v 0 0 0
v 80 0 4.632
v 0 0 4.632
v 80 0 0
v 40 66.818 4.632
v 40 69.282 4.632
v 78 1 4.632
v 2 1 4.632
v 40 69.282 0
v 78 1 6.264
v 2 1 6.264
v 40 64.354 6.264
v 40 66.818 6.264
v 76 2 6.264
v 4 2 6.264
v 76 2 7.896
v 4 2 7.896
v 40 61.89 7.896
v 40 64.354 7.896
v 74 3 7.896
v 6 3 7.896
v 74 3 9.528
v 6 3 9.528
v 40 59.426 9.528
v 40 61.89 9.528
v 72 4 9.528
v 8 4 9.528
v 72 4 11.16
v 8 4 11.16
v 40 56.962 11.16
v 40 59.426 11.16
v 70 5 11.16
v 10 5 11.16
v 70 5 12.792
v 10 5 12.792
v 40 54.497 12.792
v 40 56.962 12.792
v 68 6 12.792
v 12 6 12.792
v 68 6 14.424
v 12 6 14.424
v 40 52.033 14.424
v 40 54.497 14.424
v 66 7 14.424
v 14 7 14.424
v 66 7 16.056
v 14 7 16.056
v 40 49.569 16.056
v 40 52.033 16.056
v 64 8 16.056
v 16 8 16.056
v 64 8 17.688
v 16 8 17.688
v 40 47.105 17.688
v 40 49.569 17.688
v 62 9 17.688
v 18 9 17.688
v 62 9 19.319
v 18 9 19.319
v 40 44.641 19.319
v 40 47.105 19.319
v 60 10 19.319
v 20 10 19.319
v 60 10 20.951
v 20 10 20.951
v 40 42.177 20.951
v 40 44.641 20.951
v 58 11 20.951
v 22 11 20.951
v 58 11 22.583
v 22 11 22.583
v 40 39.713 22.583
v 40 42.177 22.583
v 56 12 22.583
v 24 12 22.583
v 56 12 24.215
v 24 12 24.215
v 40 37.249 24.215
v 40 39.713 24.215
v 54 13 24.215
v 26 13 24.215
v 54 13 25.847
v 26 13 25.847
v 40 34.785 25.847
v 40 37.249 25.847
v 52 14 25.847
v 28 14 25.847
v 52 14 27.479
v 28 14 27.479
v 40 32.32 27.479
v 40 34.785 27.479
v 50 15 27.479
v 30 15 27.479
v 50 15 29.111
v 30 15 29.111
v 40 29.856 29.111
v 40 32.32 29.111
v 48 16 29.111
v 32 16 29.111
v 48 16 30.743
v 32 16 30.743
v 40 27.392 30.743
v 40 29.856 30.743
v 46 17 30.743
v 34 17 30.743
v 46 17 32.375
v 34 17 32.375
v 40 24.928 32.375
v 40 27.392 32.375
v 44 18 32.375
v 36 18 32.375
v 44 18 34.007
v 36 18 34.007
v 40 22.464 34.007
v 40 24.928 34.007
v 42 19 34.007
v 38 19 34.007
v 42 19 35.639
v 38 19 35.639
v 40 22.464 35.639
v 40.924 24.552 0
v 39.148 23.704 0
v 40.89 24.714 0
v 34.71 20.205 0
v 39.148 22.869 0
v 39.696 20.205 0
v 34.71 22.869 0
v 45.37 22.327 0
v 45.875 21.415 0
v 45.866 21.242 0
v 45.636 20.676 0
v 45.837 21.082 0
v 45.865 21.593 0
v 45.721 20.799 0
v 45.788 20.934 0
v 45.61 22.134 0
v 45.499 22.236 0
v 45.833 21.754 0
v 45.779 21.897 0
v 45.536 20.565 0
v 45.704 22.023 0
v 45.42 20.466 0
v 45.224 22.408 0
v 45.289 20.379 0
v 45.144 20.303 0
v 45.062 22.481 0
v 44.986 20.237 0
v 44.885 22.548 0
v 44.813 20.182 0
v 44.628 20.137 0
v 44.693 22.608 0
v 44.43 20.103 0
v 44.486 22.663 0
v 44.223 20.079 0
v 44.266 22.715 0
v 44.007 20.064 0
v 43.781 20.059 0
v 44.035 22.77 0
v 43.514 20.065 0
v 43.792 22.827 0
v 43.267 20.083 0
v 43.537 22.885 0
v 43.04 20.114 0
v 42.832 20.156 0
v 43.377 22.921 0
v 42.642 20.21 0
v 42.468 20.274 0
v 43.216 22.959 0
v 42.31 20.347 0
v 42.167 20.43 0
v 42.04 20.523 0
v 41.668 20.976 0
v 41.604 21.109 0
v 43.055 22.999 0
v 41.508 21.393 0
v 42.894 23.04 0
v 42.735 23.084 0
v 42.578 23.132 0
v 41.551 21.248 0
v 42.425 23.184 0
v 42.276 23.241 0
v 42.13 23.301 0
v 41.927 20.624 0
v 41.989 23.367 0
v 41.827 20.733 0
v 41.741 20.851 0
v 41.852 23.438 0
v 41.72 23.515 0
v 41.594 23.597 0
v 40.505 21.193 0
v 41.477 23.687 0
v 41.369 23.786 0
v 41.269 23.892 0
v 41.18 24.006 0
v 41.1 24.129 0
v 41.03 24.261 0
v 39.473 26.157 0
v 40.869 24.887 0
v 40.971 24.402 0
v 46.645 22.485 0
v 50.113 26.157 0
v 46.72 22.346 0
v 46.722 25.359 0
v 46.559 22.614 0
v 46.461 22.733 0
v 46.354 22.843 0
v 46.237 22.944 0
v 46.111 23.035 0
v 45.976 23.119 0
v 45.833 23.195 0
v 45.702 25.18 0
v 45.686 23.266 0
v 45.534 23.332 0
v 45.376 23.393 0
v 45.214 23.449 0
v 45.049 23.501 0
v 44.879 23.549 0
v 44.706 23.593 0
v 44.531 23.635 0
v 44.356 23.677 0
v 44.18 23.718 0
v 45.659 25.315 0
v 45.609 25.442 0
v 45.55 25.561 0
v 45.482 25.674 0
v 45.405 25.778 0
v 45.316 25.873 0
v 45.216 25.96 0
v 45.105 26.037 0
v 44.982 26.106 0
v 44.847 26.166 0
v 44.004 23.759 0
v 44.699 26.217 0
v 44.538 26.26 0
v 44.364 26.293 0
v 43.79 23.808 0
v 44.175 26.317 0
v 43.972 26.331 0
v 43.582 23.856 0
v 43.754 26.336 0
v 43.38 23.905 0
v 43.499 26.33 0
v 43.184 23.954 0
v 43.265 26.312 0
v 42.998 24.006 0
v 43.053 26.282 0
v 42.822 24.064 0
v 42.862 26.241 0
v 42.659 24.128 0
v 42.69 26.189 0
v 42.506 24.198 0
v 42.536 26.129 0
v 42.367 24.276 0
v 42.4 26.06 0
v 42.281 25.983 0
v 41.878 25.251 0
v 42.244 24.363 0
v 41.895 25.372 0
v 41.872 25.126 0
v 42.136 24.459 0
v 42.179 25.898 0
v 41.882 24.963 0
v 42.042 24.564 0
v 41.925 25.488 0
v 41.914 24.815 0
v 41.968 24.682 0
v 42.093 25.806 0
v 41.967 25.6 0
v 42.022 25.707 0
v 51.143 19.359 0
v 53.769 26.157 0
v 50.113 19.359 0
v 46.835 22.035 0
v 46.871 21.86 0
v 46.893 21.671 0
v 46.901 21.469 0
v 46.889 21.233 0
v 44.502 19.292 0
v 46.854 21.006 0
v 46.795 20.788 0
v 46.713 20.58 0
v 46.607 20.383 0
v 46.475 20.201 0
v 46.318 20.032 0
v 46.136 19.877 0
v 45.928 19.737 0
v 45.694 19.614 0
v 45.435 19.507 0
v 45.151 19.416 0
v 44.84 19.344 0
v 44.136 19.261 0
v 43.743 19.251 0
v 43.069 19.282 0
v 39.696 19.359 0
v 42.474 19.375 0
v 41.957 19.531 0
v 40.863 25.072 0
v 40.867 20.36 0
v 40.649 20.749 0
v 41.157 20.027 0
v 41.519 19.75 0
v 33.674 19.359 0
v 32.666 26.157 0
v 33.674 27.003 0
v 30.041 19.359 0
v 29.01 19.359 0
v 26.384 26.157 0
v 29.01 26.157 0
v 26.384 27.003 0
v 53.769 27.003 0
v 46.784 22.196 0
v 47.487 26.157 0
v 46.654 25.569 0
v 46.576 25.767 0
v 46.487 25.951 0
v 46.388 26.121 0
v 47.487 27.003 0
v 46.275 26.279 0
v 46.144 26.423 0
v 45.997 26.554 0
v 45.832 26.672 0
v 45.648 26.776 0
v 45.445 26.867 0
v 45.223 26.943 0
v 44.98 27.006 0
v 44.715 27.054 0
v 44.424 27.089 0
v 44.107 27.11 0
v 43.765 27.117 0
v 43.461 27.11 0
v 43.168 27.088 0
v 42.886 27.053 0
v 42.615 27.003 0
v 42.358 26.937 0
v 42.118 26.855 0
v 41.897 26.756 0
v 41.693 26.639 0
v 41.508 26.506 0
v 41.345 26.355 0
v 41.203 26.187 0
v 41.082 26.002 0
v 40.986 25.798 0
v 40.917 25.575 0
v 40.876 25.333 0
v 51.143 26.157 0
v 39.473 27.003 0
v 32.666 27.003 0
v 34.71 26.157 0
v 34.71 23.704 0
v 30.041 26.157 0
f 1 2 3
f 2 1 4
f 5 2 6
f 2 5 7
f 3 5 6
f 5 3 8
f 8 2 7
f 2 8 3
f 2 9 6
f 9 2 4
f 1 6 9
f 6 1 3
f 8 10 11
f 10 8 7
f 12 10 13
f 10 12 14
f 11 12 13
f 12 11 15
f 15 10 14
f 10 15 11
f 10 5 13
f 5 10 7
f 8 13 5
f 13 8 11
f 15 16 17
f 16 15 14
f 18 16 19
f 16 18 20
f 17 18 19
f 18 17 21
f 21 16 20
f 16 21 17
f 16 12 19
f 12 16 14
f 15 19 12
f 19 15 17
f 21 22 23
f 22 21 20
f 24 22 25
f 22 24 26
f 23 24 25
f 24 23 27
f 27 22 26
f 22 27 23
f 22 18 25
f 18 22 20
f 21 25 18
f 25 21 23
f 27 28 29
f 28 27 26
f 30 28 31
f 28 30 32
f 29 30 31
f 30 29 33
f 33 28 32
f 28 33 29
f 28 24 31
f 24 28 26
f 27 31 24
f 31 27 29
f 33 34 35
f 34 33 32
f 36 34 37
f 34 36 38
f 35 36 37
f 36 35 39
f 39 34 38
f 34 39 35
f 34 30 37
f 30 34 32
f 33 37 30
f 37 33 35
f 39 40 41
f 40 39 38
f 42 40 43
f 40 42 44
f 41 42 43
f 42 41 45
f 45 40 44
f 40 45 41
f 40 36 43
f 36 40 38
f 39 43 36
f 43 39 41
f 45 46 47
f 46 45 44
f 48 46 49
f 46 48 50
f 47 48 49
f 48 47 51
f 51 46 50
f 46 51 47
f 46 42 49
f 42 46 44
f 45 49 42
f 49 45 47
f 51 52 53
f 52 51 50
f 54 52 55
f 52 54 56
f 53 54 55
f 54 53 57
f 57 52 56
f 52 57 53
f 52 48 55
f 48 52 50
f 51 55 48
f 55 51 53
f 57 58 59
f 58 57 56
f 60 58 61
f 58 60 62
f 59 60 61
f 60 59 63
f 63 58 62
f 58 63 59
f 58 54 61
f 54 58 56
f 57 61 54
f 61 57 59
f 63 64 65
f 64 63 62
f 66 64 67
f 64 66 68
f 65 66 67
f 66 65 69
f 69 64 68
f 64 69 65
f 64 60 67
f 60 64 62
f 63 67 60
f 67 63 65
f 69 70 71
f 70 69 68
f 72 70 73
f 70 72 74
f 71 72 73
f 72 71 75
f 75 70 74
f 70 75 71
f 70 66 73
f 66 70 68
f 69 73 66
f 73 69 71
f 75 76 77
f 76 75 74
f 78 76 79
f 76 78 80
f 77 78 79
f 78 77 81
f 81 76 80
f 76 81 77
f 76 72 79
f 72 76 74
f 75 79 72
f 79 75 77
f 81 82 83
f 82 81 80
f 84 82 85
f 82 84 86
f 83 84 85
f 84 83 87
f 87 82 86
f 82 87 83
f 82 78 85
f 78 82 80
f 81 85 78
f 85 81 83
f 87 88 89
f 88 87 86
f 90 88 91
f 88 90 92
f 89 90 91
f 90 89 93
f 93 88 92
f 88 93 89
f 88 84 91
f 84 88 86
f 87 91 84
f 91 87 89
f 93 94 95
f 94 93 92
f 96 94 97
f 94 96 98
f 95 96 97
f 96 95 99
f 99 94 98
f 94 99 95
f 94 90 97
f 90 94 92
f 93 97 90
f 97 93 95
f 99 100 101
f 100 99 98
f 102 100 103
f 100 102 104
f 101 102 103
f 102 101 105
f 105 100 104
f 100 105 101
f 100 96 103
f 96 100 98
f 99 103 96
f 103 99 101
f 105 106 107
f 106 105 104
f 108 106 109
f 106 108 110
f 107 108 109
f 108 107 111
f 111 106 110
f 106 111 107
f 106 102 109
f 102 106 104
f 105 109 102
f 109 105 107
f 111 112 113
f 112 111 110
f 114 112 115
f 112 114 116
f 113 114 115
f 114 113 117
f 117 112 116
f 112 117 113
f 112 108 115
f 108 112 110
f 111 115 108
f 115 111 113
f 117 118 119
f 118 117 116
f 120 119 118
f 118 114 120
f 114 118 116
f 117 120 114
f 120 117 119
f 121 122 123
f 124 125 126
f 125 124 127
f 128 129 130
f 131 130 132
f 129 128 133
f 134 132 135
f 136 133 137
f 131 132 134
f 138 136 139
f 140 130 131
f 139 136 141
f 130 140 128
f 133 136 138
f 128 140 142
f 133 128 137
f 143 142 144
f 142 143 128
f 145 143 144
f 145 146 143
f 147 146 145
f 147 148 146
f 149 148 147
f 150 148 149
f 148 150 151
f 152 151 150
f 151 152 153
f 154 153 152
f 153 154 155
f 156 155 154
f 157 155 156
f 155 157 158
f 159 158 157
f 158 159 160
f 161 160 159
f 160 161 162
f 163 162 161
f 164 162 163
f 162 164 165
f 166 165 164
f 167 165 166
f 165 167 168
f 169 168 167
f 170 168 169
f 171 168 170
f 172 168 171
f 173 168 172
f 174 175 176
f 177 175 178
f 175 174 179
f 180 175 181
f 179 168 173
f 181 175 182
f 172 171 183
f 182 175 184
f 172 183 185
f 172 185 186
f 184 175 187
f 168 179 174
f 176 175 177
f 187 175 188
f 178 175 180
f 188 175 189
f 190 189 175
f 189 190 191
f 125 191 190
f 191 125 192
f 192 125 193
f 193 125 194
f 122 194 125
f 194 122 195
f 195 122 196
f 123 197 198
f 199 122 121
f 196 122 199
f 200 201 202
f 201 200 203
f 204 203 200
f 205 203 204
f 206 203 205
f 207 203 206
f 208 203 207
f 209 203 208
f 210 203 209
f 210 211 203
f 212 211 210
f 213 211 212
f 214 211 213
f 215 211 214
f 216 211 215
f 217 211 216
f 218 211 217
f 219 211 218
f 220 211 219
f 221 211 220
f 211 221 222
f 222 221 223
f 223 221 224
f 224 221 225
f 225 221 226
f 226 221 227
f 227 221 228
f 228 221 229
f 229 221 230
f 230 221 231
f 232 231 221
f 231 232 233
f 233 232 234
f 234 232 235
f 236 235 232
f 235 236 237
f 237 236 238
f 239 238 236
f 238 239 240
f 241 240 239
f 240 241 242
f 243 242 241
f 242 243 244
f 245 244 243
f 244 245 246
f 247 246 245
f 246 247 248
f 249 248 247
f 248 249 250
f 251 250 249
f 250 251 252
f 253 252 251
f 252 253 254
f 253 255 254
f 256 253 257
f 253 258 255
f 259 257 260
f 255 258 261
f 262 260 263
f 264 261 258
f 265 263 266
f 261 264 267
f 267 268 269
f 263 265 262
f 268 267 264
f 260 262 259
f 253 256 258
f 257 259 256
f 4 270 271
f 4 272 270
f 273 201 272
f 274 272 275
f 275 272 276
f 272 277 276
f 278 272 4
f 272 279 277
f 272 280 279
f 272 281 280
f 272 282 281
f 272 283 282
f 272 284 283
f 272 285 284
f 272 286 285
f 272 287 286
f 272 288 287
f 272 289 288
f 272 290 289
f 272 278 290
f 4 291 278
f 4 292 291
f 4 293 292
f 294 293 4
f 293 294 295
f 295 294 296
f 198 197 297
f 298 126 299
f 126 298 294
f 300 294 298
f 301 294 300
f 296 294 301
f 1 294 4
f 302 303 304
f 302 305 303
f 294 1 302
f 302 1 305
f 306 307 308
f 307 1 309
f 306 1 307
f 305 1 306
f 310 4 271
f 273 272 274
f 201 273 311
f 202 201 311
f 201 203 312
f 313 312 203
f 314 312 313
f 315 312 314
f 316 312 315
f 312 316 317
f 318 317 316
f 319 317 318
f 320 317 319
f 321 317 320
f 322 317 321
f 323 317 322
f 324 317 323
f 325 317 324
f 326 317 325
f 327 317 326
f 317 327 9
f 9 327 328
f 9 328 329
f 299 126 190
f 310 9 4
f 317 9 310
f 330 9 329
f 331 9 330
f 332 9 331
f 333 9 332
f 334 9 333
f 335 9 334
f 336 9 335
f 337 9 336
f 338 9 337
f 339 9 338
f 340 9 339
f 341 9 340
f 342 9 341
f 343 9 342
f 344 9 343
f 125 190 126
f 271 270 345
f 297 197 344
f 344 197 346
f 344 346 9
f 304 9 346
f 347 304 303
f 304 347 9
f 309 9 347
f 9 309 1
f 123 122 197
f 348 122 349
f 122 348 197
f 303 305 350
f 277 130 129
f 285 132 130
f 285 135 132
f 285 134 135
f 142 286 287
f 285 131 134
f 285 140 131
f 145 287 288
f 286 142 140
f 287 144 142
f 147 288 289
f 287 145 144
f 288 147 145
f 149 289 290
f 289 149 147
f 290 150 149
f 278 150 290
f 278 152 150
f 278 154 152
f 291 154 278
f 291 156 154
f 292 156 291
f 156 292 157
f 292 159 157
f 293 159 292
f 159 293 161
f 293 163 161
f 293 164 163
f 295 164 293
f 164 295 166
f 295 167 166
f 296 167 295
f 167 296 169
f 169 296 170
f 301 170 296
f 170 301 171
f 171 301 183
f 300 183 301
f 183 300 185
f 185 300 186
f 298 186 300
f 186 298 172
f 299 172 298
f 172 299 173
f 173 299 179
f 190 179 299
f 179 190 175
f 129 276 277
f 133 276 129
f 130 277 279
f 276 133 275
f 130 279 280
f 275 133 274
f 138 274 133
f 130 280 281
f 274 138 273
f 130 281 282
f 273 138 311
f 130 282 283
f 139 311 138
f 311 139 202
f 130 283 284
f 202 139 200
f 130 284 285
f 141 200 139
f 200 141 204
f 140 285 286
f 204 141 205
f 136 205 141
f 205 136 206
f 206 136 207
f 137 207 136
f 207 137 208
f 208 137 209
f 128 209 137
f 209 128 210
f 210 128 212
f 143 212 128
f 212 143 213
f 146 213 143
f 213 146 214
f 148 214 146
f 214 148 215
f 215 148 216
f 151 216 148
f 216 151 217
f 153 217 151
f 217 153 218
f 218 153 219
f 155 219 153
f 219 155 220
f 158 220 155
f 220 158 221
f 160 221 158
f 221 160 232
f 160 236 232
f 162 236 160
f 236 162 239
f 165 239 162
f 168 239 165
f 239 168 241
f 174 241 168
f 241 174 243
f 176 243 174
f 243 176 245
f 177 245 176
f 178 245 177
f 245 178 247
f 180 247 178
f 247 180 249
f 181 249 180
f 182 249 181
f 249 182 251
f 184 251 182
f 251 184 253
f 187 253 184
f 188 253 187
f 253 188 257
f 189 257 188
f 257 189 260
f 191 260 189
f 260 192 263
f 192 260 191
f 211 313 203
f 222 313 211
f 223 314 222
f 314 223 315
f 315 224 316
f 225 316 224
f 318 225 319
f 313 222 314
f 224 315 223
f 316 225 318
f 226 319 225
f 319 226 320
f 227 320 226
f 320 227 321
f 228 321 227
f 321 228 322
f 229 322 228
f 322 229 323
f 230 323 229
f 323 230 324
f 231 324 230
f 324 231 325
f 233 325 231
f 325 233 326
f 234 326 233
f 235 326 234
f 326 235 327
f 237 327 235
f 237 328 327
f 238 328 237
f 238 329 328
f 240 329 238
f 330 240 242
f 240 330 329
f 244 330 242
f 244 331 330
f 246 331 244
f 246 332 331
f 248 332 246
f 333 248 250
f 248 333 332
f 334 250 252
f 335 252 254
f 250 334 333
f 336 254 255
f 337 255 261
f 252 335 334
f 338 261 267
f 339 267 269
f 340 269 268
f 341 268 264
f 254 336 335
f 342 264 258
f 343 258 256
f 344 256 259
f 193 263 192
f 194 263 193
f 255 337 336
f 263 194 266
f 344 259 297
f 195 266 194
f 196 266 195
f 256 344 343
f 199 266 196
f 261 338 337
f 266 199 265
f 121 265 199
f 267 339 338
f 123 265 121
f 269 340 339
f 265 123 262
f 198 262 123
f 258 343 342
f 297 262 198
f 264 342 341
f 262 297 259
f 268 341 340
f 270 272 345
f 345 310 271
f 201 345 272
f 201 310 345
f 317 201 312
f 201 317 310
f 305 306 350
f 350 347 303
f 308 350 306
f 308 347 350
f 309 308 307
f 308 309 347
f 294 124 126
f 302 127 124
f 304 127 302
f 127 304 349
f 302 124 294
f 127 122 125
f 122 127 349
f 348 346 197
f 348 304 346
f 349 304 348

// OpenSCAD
// Generated by SolidPython 1.1.3 on 2025-04-12 11:14:56


difference() {
	union() {
		linear_extrude(height = 3) {
			polygon(points = [[0, 0], [80, 0], [40.0000000000, 69.2820323028]]);
		}
		union() {
			translate(v = [0.0000000000, 0.0000000000, 3.0]) {
				linear_extrude(height = 1.6319490479862033) {
					polygon(points = [[0.0000000000, 0.0000000000], [80.0000000000, 0.0000000000], [40.0000000000, 69.2820323028]]);
				}
			}
			translate(v = [2.0000000000, 1.0000000000, 4.631949047986203]) {
				linear_extrude(height = 1.6319490479862033) {
					polygon(points = [[0.0000000000, 0.0000000000], [76.0000000000, 0.0000000000], [38.0000000000, 65.8179306876]]);
				}
			}
			translate(v = [4.0000000000, 2.0000000000, 6.263898095972406]) {
				linear_extrude(height = 1.6319490479862033) {
					polygon(points = [[0.0000000000, 0.0000000000], [72.0000000000, 0.0000000000], [36.0000000000, 62.3538290725]]);
				}
			}
			translate(v = [6.0000000000, 3.0000000000, 7.895847143958609]) {
				linear_extrude(height = 1.6319490479862033) {
					polygon(points = [[0.0000000000, 0.0000000000], [68.0000000000, 0.0000000000], [34.0000000000, 58.8897274573]]);
				}
			}
			translate(v = [8.0000000000, 4.0000000000, 9.527796191944812]) {
				linear_extrude(height = 1.6319490479862033) {
					polygon(points = [[0.0000000000, 0.0000000000], [64.0000000000, 0.0000000000], [32.0000000000, 55.4256258422]]);
				}
			}
			translate(v = [10.0000000000, 5.0000000000, 11.159745239931016]) {
				linear_extrude(height = 1.6319490479862033) {
					polygon(points = [[0.0000000000, 0.0000000000], [60.0000000000, 0.0000000000], [30.0000000000, 51.9615242271]]);
				}
			}
			translate(v = [12.0000000000, 6.0000000000, 12.791694287917219]) {
				linear_extrude(height = 1.6319490479862033) {
					polygon(points = [[0.0000000000, 0.0000000000], [56.0000000000, 0.0000000000], [28.0000000000, 48.4974226119]]);
				}
			}
			translate(v = [14.0000000000, 7.0000000000, 14.423643335903423]) {
				linear_extrude(height = 1.6319490479862033) {
					polygon(points = [[0.0000000000, 0.0000000000], [52.0000000000, 0.0000000000], [26.0000000000, 45.0333209968]]);
				}
			}
			translate(v = [16.0000000000, 8.0000000000, 16.055592383889625]) {
				linear_extrude(height = 1.6319490479862033) {
					polygon(points = [[0.0000000000, 0.0000000000], [48.0000000000, 0.0000000000], [24.0000000000, 41.5692193817]]);
				}
			}
			translate(v = [18.0000000000, 9.0000000000, 17.68754143187583]) {
				linear_extrude(height = 1.6319490479862033) {
					polygon(points = [[0.0000000000, 0.0000000000], [44.0000000000, 0.0000000000], [22.0000000000, 38.1051177665]]);
				}
			}
			translate(v = [20.0000000000, 10.0000000000, 19.319490479862033]) {
				linear_extrude(height = 1.6319490479862033) {
					polygon(points = [[0.0000000000, 0.0000000000], [40.0000000000, 0.0000000000], [20.0000000000, 34.6410161514]]);
				}
			}
			translate(v = [22.0000000000, 11.0000000000, 20.951439527848237]) {
				linear_extrude(height = 1.6319490479862033) {
					polygon(points = [[0.0000000000, 0.0000000000], [36.0000000000, 0.0000000000], [18.0000000000, 31.1769145362]]);
				}
			}
			translate(v = [24.0000000000, 12.0000000000, 22.583388575834437]) {
				linear_extrude(height = 1.6319490479862033) {
					polygon(points = [[0.0000000000, 0.0000000000], [32.0000000000, 0.0000000000], [16.0000000000, 27.7128129211]]);
				}
			}
			translate(v = [26.0000000000, 13.0000000000, 24.215337623820645]) {
				linear_extrude(height = 1.6319490479862033) {
					polygon(points = [[0.0000000000, 0.0000000000], [28.0000000000, 0.0000000000], [14.0000000000, 24.2487113060]]);
				}
			}
			translate(v = [28.0000000000, 14.0000000000, 25.847286671806845]) {
				linear_extrude(height = 1.6319490479862033) {
					polygon(points = [[0.0000000000, 0.0000000000], [24.0000000000, 0.0000000000], [12.0000000000, 20.7846096908]]);
				}
			}
			translate(v = [30.0000000000, 15.0000000000, 27.47923571979305]) {
				linear_extrude(height = 1.6319490479862033) {
					polygon(points = [[0.0000000000, 0.0000000000], [20.0000000000, 0.0000000000], [10.0000000000, 17.3205080757]]);
				}
			}
			translate(v = [32.0000000000, 16.0000000000, 29.111184767779253]) {
				linear_extrude(height = 1.6319490479862033) {
					polygon(points = [[0.0000000000, 0.0000000000], [16.0000000000, 0.0000000000], [8.0000000000, 13.8564064606]]);
				}
			}
			translate(v = [34.0000000000, 17.0000000000, 30.743133815765454]) {
				linear_extrude(height = 1.6319490479862033) {
					polygon(points = [[0.0000000000, 0.0000000000], [12.0000000000, 0.0000000000], [6.0000000000, 10.3923048454]]);
				}
			}
			translate(v = [36.0000000000, 18.0000000000, 32.37508286375166]) {
				linear_extrude(height = 1.6319490479862033) {
					polygon(points = [[0.0000000000, 0.0000000000], [8.0000000000, 0.0000000000], [4.0000000000, 6.9282032303]]);
				}
			}
			translate(v = [38.0000000000, 19.0000000000, 34.00703191173786]) {
				linear_extrude(height = 1.6319490479862033) {
					polygon(points = [[0.0000000000, 0.0000000000], [4.0000000000, 0.0000000000], [2.0000000000, 3.4641016151]]);
				}
			}
		}
	}
	translate(v = [40.0000000000, 23.0940107676, -2]) {
		linear_extrude(height = 2) {
			text(halign = "center", size = 8, text = "TEST", valign = "center");
		}
	}
}
/***********************************************
*********      SolidPython code:      **********
************************************************
 
#!/usr/bin/env python3
"""
Improved 3D Model Generation Module for Crazy Stock Badges Project

This module provides classes and functions for generating 3D models from stock data
using SolidPython to create OpenSCAD files that can be rendered to STL for 3D printing.
"""

import os
import numpy as np
import pandas as pd
from solid import *
from solid.utils import *
import logging
from abc import ABC, abstractmethod
from pathlib import Path
import math

# Configure logging
logging.basicConfig(
    level=logging.INFO,
    format='%(asctime)s - %(name)s - %(levelname)s - %(message)s'
)
logger = logging.getLogger('improved_3d_models')


class StockDataValidator:
    """Validates and preprocesses stock data for 3D model generation."""
    
    @staticmethod
    def validate_data(data):
        """
        Validate that the data contains the required columns.
        
        Args:
            data (pandas.DataFrame): Stock data
            
        Returns:
            bool: True if data is valid, False otherwise
        """
        required_columns = ['Close', 'Volume']
        
        if not isinstance(data, pd.DataFrame):
            logger.error("Data must be a pandas DataFrame")
            return False
        
        for col in required_columns:
            if col not in data.columns:
                logger.error(f"Required column '{col}' not found in data")
                return False
        
        if len(data) < 5:
            logger.error("Data must contain at least 5 rows")
            return False
            
        return True
    
    @staticmethod
    def normalize_data(data, columns=None, new_min=0, new_max=10):
        """
        Normalize specified columns to a new range.
        
        Args:
            data (pandas.DataFrame): Stock data
            columns (list): List of columns to normalize
            new_min (float): Minimum value for normalized data
            new_max (float): Maximum value for normalized data
            
        Returns:
            pandas.DataFrame: Data with normalized columns added
        """
        if columns is None:
            columns = ['Close', 'Volume']
        
        result = data.copy()
        
        for col in columns:
            if col in data.columns:
                norm_col = f'{col}_Normalized'
                min_val = data[col].min()
                max_val = data[col].max()
                
                # Avoid division by zero
                if max_val == min_val:
                    result[norm_col] = new_min
                else:
                    result[norm_col] = (data[col] - min_val) / (max_val - min_val) * (new_max - new_min) + new_min
            else:
                logger.warning(f"Column '{col}' not found in data, skipping normalization")
        
        return result


class Badge3DModel(ABC):
    """Abstract base class for 3D badge models."""
    
    def __init__(self, stock_data, ticker_symbol, params=None):
        """
        Initialize the 3D model.
        
        Args:
            stock_data (pandas.DataFrame): Stock data
            ticker_symbol (str): Stock ticker symbol
            params (dict): Additional parameters for the model
        """
        self.ticker_symbol = ticker_symbol
        self.params = params or {}
        
        # Validate and normalize data
        validator = StockDataValidator()
        if not validator.validate_data(stock_data):
            raise ValueError("Invalid stock data")
        
        # Set default normalization ranges
        height_range = self.params.get('height_range', (0, 15))
        width_range = self.params.get('width_range', (0, 10))
        
        # Normalize data
        self.data = validator.normalize_data(
            stock_data, 
            columns=['Close', 'Volume', 'High', 'Low'],
            new_min=height_range[0],
            new_max=height_range[1]
        )
        
        # Normalize volume separately for width
        self.data['Volume_Width'] = validator.normalize_data(
            stock_data, 
            columns=['Volume'],
            new_min=width_range[0],
            new_max=width_range[1]
        )['Volume_Normalized']
        
        # Initialize model components
        self.base_model = None
        self.feature_model = None
        self.text_model = None
        self.final_model = None
        
        # Model statistics
        self.stats = {
            'num_objects': 0,
            'height_diff': 0,
            'width_diff': 0,
            'depth_diff': 0,
            'size': (0, 0, 0)
        }
    
    @abstractmethod
    def generate_base(self):
        """Generate the base part of the model."""
        pass
    
    @abstractmethod
    def generate_feature(self):
        """Generate the feature part of the model based on stock data."""
        pass
    
    @abstractmethod
    def generate_text(self):
        """Generate text elements for the model."""
        pass
    
    def combine_models(self):
        """
        Combine base, feature, and text models into the final model.
        
        Returns:
            solid.OpenSCADObject: Combined 3D model
        """
        if self.base_model is None:
            self.generate_base()
        
        if self.feature_model is None:
            self.generate_feature()
        
        if self.text_model is None:
            self.generate_text()
        
        # Combine models
        combined = union()(
            self.base_model,
            self.feature_model
        )
        
        # Apply text as a difference (engraving)
        if self.text_model is not None:
            self.final_model = difference()(
                combined,
                self.text_model
            )
        else:
            self.final_model = combined
        
        return self.final_model
    
    def calculate_stats(self):
        """
        Calculate statistics about the model.
        
        Returns:
            dict: Model statistics
        """
        # This is a placeholder - in a real implementation, we would
        # analyze the OpenSCAD model to extract these statistics
        self.stats['num_objects'] = len(self.data)
        self.stats['height_diff'] = self.params.get('height_range', (0, 15))[1]
        self.stats['width_diff'] = self.params.get('width_range', (0, 10))[1]
        self.stats['depth_diff'] = 5  # Example value
        self.stats['size'] = (100, 100, 20)  # Example values
        
        return self.stats
    
    def save_to_file(self, filename=None):
        """
        Save the model to an OpenSCAD file.
        
        Args:
            filename (str): Output filename
            
        Returns:
            str: Path to the saved file
        """
        if self.final_model is None:
            self.combine_models()
        
        if filename is None:
            filename = f"{self.ticker_symbol}_badge.scad"
        
        # Save the model
        scad_render_to_file(self.final_model, filename)
        logger.info(f"Model saved to {filename}")
        
        return filename


class DiscBadge(Badge3DModel):
    """Circular badge with stock data features."""
    
    def generate_base(self):
        """
        Generate a circular base for the badge.
        
        Returns:
            solid.OpenSCADObject: Base 3D model
        """
        radius = self.params.get('base_radius', 50)
        height = self.params.get('base_height', 3)
        
        self.base_model = cylinder(r=radius, h=height, center=False)
        return self.base_model
    
    def generate_feature(self):
        """
        Generate features on the badge based on stock data.
        
        Returns:
            solid.OpenSCADObject: Feature 3D model
        """
        feature_type = self.params.get('feature_type', 'jagged_edge')
        
        if feature_type == 'jagged_edge':
            self.feature_model = self._generate_jagged_edge()
        elif feature_type == 'spiral':
            self.feature_model = self._generate_spiral()
        else:
            logger.warning(f"Unknown feature type: {feature_type}, using jagged_edge")
            self.feature_model = self._generate_jagged_edge()
        
        return self.feature_model
    
    def _generate_jagged_edge(self):
        """
        Generate a jagged edge disc based on stock prices.
        
        Returns:
            solid.OpenSCADObject: Jagged edge 3D model
        """
        base_radius = self.params.get('base_radius', 50)
        height = self.params.get('feature_height', 2)
        z_offset = self.params.get('base_height', 3)
        
        # Parameters for the polygon
        num_points = len(self.data)  # Use all data points
        angles = np.linspace(0, 2 * np.pi, num_points)  # Angles around the circle
        
        # Map normalized stock prices to the polygon edge
        radii = self.data['Close_Normalized'] + base_radius
        
        # Create points for the polygon
        points = []
        for i in range(num_points):
            x = radii.iloc[i] * np.cos(angles[i])  # X coordinate
            y = radii.iloc[i] * np.sin(angles[i])  # Y coordinate
            points.append([x, y])
        
        # Create 2D polygon and extrude to 3D
        jagged_disc_2d = polygon(points)
        jagged_disc_3d = linear_extrude(height=height)(jagged_disc_2d)
        
        # Translate to sit on top of the base
        return translate([0, 0, z_offset])(jagged_disc_3d)
    
    def _generate_spiral(self):
        """
        Generate a spiral landscape based on stock data.
        
        Returns:
            solid.OpenSCADObject: Spiral landscape 3D model
        """
        radius = self.params.get('spiral_radius', 45)
        z_offset = self.params.get('base_height', 3)
        spiral_turns = self.params.get('spiral_turns', 7)
        
        # Generate points on a spiral
        num_points = len(self.data)
        angles = np.linspace(0, spiral_turns * 2 * np.pi, num_points)  # Spiral angles
        radii = np.linspace(0, radius, num_points)  # Gradually increase radius for spiral
        
        # Map normalized stock prices to heights and widths
        heights = self.data['Close_Normalized']
        widths = self.data['Volume_Width']
        
        # Calculate coordinates
        x = radii * np.cos(angles)  # X coordinates
        y = radii * np.sin(angles)  # Y coordinates
        
        # Create the landscape as a series of stacked cylinders
        landscape = []
        for i in range(num_points):
            cylinder_height = heights.iloc[i]
            cylinder_radius = widths.iloc[i]
            
            landscape.append(
                translate([x[i], y[i], z_offset])(
                    cylinder(r=cylinder_radius, h=cylinder_height, center=False)
                )
            )
        
        # Combine the landscape into a single object
        return union()(landscape)
    
    def generate_text(self):
        """
        Generate text for the badge.
        
        Returns:
            solid.OpenSCADObject: Text 3D model
        """
        text_depth = self.params.get('text_depth', 2)
        text_size = self.params.get('text_size', 10)
        text_content = self.params.get('text_content', self.ticker_symbol)
        text_position = self.params.get('text_position', 'bottom')
        
        # Create text object
        if len(text_content) > 10:
            # For longer text, use multiline
            self.text_model = self._generate_multiline_text(
                text_content, text_size, text_depth
            )
        else:
            # For shorter text, use single line
            text_2d = text(text_content, size=text_size, halign='center', valign='center')
            self.text_model = linear_extrude(height=text_depth)(text_2d)
        
        # Position the text
        if text_position == 'bottom':
            # Position text on the bottom of the badge (as an engraving)
            z_pos = -text_depth
            self.text_model = translate([0, 0, z_pos])(self.text_model)
        elif text_position == 'top':
            # Position text on the top of the badge
            base_height = self.params.get('base_height', 3)
            feature_height = self.params.get('feature_height', 2)
            z_pos = base_height + feature_height
            self.text_model = translate([0, 0, z_pos])(self.text_model)
        
        return self.text_model
    
    def _generate_multiline_text(self, text_content, size, depth, wrap_chars=10):
        """
        Generate multiline text object.
        
        Args:
            text_content (str): Text to display
            size (float): Text size
            depth (float): Text depth
            wrap_chars (int): Number of characters per line
            
        Returns:
            solid.OpenSCADObject: Multiline text 3D model
        """
        # Split text into lines
        lines = [text_content[i:i+wrap_chars] for i in range(0, len(text_content), wrap_chars)]
        num_lines = len(lines)
        
        # Generate 3D text objects for each line and center them
        text_objects = []
        line_spacing = size * 1.2  # Adjust spacing based on text size
        
        for i, line in enumerate(lines):
            y_offset = (num_lines - 1) / 2 - i  # Center the text block
            text_2d = text(line, size=size, halign='center', valign='center')
            text_3d = linear_extrude(height=depth)(text_2d)
            text_objects.append(translate([0, y_offset * line_spacing, 0])(text_3d))
        
        return union()(text_objects)


class RectangularBadge(Badge3DModel):
    """Rectangular badge with stock data features."""
    
    def generate_base(self):
        """
        Generate a rectangular base for the badge.
        
        Returns:
            solid.OpenSCADObject: Base 3D model
        """
        width = self.params.get('base_width', 100)
        depth = self.params.get('base_depth', 60)
        height = self.params.get('base_height', 3)
        
        self.base_model = cube([width, depth, height], center=False)
        return self.base_model
    
    def generate_feature(self):
        """
        Generate features on the badge based on stock data.
        
        Returns:
            solid.OpenSCADObject: Feature 3D model
        """
        feature_type = self.params.get('feature_type', 'bar_chart')
        
        if feature_type == 'bar_chart':
            self.feature_model = self._generate_bar_chart()
        elif feature_type == 'surface_plot':
            self.feature_model = self._generate_surface_plot()
        else:
            logger.warning(f"Unknown feature type: {feature_type}, using bar_chart")
            self.feature_model = self._generate_bar_chart()
        
        return self.feature_model
    
    def _generate_bar_chart(self):
        """
        Generate a bar chart based on stock prices.
        
        Returns:
            solid.OpenSCADObject: Bar chart 3D model
        """
        base_width = self.params.get('base_width', 100)
        base_depth = self.params.get('base_depth', 60)
        z_offset = self.params.get('base_height', 3)
        bar_width = base_width / len(self.data)
        
        # Create bars for each data point
        bars = []
        for i in range(len(self.data)):
            bar_height = self.data['Close_Normalized'].iloc[i]
            bar_depth = base_depth * 0.8  # Make bars slightly narrower than the base
            
            # Position each bar along the x-axis
            x_pos = i * bar_width
            y_pos = (base_depth - bar_depth) / 2  # Center bars on the y-axis
            
            bars.append(
                translate([x_pos, y_pos, z_offset])(
                    cube([bar_width * 0.9, bar_depth, bar_height])
                )
            )
        
        return union()(bars)
    
    def _generate_surface_plot(self):
        """
        Generate a surface plot based on stock data.
        
        Returns:
            solid.OpenSCADObject: Surface plot 3D model
        """
        base_width = self.params.get('base_width', 100)
        base_depth = self.params.get('base_depth', 60)
        z_offset = self.params.get('base_height', 3)
        
        # Create a grid of points
        grid_size = int(math.sqrt(len(self.data)))
        if grid_size < 2:
            grid_size = 2
        
        # Truncate data to fit grid
        data_points = min(grid_size * grid_size, len(self.data))
        heights = self.data['Close_Normalized'].iloc[:data_points].values
        
        # Reshape to grid
        try:
            height_grid = heights[:grid_size * grid_size].reshape(grid_size, grid_size)
        except ValueError:
            # If reshaping fails, pad with zeros
            padded = np.zeros(grid_size * grid_size)
            padded[:len(heights)] = heights
            height_grid = padded.reshape(grid_size, grid_size)
        
        # Calculate cell dimensions
        cell_width = base_width / grid_size
        cell_depth = base_depth / grid_size
        
        # Create cells for the surface
        cells = []
        for i in range(grid_size):
            for j in range(grid_size):
                cell_height = height_grid[i, j]
                
                x_pos = i * cell_width
                y_pos = j * cell_depth
                
                cells.append(
                    translate([x_pos, y_pos, z_offset])(
                        cube([cell_width * 0.95, cell_depth * 0.95, cell_height])
                    )
                )
        
        return union()(cells)
    
    def generate_text(self):
        """
        Generate text for the badge.
        
        Returns:
            solid.OpenSCADObject: Text 3D model
        """
        text_depth = self.params.get('text_depth', 2)
        text_size = self.params.get('text_size', 10)
        text_content = self.params.get('text_content', self.ticker_symbol)
        text_position = self.params.get('text_position', 'bottom')
        
        base_width = self.params.get('base_width', 100)
        base_depth = self.params.get('base_depth', 60)
        
        # Create text object
        text_2d = text(text_content, size=text_size, halign='center', valign='center')
        self.text_model = linear_extrude(height=text_depth)(text_2d)
        
        # Position the text
        x_pos = base_width / 2  # Center on x-axis
        y_pos = base_depth / 2  # Center on y-axis
        
        if text_position == 'bottom':
            # Position text on the bottom of the badge (as an engraving)
            z_pos = -text_depth
            self.text_model = translate([x_pos, y_pos, z_pos])(self.text_model)
        elif text_position == 'top':
            # Position text on the top of the badge
            base_height = self.params.get('base_height', 3)
            feature_height = self.params.get('feature_height', 10)  # Approximate
            z_pos = base_height + feature_height
            self.text_model = translate([x_pos, y_pos, z_pos])(self.text_model)
        elif text_position == 'front':
            # Position text on the front of the badge
            z_pos = self.params.get('base_height', 3) / 2
            y_pos = 0  # Front edge
            self.text_model = translate([x_pos, y_pos, z_pos])(
                rotate([90, 0, 0])(self.text_model)
            )
        
        return self.text_model


class TriangularBadge(Badge3DModel):
    """Triangular badge with stock data features."""
    
    def generate_base(self):
        """
        Generate a triangular base for the badge.
        
        Returns:
            solid.OpenSCADObject: Base 3D model
        """
        side_length = self.params.get('side_length', 80)
        height = self.params.get('base_height', 3)
        
        # Create an equilateral triangle
        points = [
            [0, 0],
            [side_length, 0],
            [side_length / 2, side_length * math.sin(math.radians(60))]
        ]
        
        triangle_2d = polygon(points)
        self.base_model = linear_extrude(height=height)(triangle_2d)
        return self.base_model
    
    def generate_feature(self):
        """
        Generate features on the badge based on stock data.
        
        Returns:
            solid.OpenSCADObject: Feature 3D model
        """
        feature_type = self.params.get('feature_type', 'pyramid')
        
        if feature_type == 'pyramid':
            self.feature_model = self._generate_pyramid()
        elif feature_type == 'terrain':
            self.feature_model = self._generate_terrain()
        else:
            logger.warning(f"Unknown feature type: {feature_type}, using pyramid")
            self.feature_model = self._generate_pyramid()
        
        return self.feature_model
    
    def _generate_pyramid(self):
        """
        Generate a pyramid feature with height based on stock data.
        
        Returns:
            solid.OpenSCADObject: Pyramid 3D model
        """
        side_length = self.params.get('side_length', 80)
        z_offset = self.params.get('base_height', 3)
        
        # Use the average of normalized close prices for the pyramid height
        pyramid_height = self.data['Close_Normalized'].mean() * 3
        
        # Create a pyramid (triangular prism)
        points = [
            [0, 0],
            [side_length, 0],
            [side_length / 2, side_length * math.sin(math.radians(60))]
        ]
        
        # Create the pyramid by scaling a series of triangles
        layers = 20  # Number of layers in the pyramid
        pyramid_parts = []
        
        for i in range(layers):
            # Calculate the scale factor for this layer
            scale_factor = 1.0 - (i / layers)
            layer_height = pyramid_height * (i / layers)
            
            # Scale the points for this layer
            scaled_points = [[p[0] * scale_factor, p[1] * scale_factor] for p in points]
            
            # Create the layer
            layer_2d = polygon(scaled_points)
            layer_3d = linear_extrude(height=pyramid_height/layers)(layer_2d)
            
            # Position the layer
            pyramid_parts.append(
                translate([
                    side_length * (1 - scale_factor) / 2,  # Center on x
                    side_length * (1 - scale_factor) / 4,  # Center on y
                    z_offset + layer_height
                ])(layer_3d)
            )
        
        return union()(pyramid_parts)
    
    def _generate_terrain(self):
        """
        Generate a terrain feature based on stock data.
        
        Returns:
            solid.OpenSCADObject: Terrain 3D model
        """
        side_length = self.params.get('side_length', 80)
        z_offset = self.params.get('base_height', 3)
        
        # Create a triangular grid
        grid_size = 10  # Number of divisions along each side
        
        # Calculate the height of the triangle
        triangle_height = side_length * math.sin(math.radians(60))
        
        # Calculate cell dimensions
        cell_width = side_length / grid_size
        cell_height = triangle_height / grid_size
        
        # Create cells for the terrain
        cells = []
        
        # Use stock data to determine cell heights
        # We'll cycle through the data if we need more points than we have
        data_len = len(self.data)
        
        cell_count = 0
        for i in range(grid_size):
            # Calculate the number of cells in this row
            row_cells = grid_size - i
            
            for j in range(row_cells):
                # Get the data index, cycling if necessary
                data_idx = cell_count % data_len
                cell_count += 1
                
                # Get the height for this cell
                terrain_height = self.data['Close_Normalized'].iloc[data_idx]
                
                # Calculate position
                x_pos = j * cell_width + (i * cell_width / 2)  # Offset each row
                y_pos = i * cell_height
                
                cells.append(
                    translate([x_pos, y_pos, z_offset])(
                        cube([cell_width * 0.95, cell_height * 0.95, terrain_height])
                    )
                )
        
        return union()(cells)
    
    def generate_text(self):
        """
        Generate text for the badge.
        
        Returns:
            solid.OpenSCADObject: Text 3D model
        """
        text_depth = self.params.get('text_depth', 2)
        text_size = self.params.get('text_size', 8)
        text_content = self.params.get('text_content', self.ticker_symbol)
        text_position = self.params.get('text_position', 'bottom')
        
        side_length = self.params.get('side_length', 80)
        
        # Create text object
        text_2d = text(text_content, size=text_size, halign='center', valign='center')
        self.text_model = linear_extrude(height=text_depth)(text_2d)
        
        # Position the text
        x_pos = side_length / 2  # Center on x-axis
        y_pos = side_length * math.sin(math.radians(60)) / 3  # Lower third of triangle
        
        if text_position == 'bottom':
            # Position text on the bottom of the badge (as an engraving)
            z_pos = -text_depth
            self.text_model = translate([x_pos, y_pos, z_pos])(self.text_model)
        elif text_position == 'top':
            # Position text on the top of the badge
            base_height = self.params.get('base_height', 3)
            feature_height = self.params.get('feature_height', 10)  # Approximate
            z_pos = base_height + feature_height
            self.text_model = translate([x_pos, y_pos, z_pos])(self.text_model)
        
        return self.text_model


class BadgeFactory:
    """Factory class for creating different types of badges."""
    
    @staticmethod
    def create_badge(badge_type, stock_data, ticker_symbol, params=None):
        """
        Create a badge of the specified type.
        
        Args:
            badge_type (str): Type of badge to create
            stock_data (pandas.DataFrame): Stock data
            ticker_symbol (str): Stock ticker symbol
            params (dict): Additional parameters for the badge
            
        Returns:
            Badge3DModel: Badge model instance
        """
        if badge_type == 'disc':
            return DiscBadge(stock_data, ticker_symbol, params)
        elif badge_type == 'rectangular':
            return RectangularBadge(stock_data, ticker_symbol, params)
        elif badge_type == 'triangular':
            return TriangularBadge(stock_data, ticker_symbol, params)
        else:
            logger.warning(f"Unknown badge type: {badge_type}, using disc")
            return DiscBadge(stock_data, ticker_symbol, params)


def main():
    """
    Main function for testing the module.
    """
    import argparse
    
    parser = argparse.ArgumentParser(description='Generate 3D badge models from stock data')
    parser.add_argument('--ticker', type=str, default='TSLA', help='Stock ticker symbol')
    parser.add_argument('--data-file', type=str, default='./stock_data', help='Stock data CSV file')
    parser.add_argument('--badge-type', type=str, default='disc', 
                       choices=['disc', 'rectangular', 'triangular'], help='Badge type')
    parser.add_argument('--feature-type', type=str, help='Feature type (depends on badge type)')
    parser.add_argument('--output', type=str, help='Output file name')
    args = parser.parse_args()
    
    try:
        # Load stock data
        if os.path.exists(args.data_file):
            stock_data = pd.read_csv(args.data_file)
            logger.info(f"Loaded stock data from {args.data_file}")
        else:
            logger.error(f"Data file not found: {args.data_file}")
            return 1
        
        # Set parameters based on badge type
        params = {}
        if args.feature_type:
            params['feature_type'] = args.feature_type
        
        # Create the badge
        badge = BadgeFactory.create_badge(args.badge_type, stock_data, args.ticker, params)
        
        # Generate the model
        badge.generate_base()
        badge.generate_feature()
        badge.generate_text()
        badge.combine_models()
        
        # Calculate and print statistics
        stats = badge.calculate_stats()
        print("\nModel Statistics:")
        for key, value in stats.items():
            print(f"  {key}: {value}")
        
        # Save the model
        output_file = args.output or f"{args.ticker}_{args.badge_type}_badge.scad"
        badge.save_to_file(output_file)
        print(f"\nModel saved to: {output_file}")
        
    except Exception as e:
        logger.error(f"Error in main function: {e}")
        print(f"Error: {str(e)}")
        return 1
    
    return 0


if __name__ == "__main__":
    import sys
    sys.exit(main())
 
 
************************************************/
